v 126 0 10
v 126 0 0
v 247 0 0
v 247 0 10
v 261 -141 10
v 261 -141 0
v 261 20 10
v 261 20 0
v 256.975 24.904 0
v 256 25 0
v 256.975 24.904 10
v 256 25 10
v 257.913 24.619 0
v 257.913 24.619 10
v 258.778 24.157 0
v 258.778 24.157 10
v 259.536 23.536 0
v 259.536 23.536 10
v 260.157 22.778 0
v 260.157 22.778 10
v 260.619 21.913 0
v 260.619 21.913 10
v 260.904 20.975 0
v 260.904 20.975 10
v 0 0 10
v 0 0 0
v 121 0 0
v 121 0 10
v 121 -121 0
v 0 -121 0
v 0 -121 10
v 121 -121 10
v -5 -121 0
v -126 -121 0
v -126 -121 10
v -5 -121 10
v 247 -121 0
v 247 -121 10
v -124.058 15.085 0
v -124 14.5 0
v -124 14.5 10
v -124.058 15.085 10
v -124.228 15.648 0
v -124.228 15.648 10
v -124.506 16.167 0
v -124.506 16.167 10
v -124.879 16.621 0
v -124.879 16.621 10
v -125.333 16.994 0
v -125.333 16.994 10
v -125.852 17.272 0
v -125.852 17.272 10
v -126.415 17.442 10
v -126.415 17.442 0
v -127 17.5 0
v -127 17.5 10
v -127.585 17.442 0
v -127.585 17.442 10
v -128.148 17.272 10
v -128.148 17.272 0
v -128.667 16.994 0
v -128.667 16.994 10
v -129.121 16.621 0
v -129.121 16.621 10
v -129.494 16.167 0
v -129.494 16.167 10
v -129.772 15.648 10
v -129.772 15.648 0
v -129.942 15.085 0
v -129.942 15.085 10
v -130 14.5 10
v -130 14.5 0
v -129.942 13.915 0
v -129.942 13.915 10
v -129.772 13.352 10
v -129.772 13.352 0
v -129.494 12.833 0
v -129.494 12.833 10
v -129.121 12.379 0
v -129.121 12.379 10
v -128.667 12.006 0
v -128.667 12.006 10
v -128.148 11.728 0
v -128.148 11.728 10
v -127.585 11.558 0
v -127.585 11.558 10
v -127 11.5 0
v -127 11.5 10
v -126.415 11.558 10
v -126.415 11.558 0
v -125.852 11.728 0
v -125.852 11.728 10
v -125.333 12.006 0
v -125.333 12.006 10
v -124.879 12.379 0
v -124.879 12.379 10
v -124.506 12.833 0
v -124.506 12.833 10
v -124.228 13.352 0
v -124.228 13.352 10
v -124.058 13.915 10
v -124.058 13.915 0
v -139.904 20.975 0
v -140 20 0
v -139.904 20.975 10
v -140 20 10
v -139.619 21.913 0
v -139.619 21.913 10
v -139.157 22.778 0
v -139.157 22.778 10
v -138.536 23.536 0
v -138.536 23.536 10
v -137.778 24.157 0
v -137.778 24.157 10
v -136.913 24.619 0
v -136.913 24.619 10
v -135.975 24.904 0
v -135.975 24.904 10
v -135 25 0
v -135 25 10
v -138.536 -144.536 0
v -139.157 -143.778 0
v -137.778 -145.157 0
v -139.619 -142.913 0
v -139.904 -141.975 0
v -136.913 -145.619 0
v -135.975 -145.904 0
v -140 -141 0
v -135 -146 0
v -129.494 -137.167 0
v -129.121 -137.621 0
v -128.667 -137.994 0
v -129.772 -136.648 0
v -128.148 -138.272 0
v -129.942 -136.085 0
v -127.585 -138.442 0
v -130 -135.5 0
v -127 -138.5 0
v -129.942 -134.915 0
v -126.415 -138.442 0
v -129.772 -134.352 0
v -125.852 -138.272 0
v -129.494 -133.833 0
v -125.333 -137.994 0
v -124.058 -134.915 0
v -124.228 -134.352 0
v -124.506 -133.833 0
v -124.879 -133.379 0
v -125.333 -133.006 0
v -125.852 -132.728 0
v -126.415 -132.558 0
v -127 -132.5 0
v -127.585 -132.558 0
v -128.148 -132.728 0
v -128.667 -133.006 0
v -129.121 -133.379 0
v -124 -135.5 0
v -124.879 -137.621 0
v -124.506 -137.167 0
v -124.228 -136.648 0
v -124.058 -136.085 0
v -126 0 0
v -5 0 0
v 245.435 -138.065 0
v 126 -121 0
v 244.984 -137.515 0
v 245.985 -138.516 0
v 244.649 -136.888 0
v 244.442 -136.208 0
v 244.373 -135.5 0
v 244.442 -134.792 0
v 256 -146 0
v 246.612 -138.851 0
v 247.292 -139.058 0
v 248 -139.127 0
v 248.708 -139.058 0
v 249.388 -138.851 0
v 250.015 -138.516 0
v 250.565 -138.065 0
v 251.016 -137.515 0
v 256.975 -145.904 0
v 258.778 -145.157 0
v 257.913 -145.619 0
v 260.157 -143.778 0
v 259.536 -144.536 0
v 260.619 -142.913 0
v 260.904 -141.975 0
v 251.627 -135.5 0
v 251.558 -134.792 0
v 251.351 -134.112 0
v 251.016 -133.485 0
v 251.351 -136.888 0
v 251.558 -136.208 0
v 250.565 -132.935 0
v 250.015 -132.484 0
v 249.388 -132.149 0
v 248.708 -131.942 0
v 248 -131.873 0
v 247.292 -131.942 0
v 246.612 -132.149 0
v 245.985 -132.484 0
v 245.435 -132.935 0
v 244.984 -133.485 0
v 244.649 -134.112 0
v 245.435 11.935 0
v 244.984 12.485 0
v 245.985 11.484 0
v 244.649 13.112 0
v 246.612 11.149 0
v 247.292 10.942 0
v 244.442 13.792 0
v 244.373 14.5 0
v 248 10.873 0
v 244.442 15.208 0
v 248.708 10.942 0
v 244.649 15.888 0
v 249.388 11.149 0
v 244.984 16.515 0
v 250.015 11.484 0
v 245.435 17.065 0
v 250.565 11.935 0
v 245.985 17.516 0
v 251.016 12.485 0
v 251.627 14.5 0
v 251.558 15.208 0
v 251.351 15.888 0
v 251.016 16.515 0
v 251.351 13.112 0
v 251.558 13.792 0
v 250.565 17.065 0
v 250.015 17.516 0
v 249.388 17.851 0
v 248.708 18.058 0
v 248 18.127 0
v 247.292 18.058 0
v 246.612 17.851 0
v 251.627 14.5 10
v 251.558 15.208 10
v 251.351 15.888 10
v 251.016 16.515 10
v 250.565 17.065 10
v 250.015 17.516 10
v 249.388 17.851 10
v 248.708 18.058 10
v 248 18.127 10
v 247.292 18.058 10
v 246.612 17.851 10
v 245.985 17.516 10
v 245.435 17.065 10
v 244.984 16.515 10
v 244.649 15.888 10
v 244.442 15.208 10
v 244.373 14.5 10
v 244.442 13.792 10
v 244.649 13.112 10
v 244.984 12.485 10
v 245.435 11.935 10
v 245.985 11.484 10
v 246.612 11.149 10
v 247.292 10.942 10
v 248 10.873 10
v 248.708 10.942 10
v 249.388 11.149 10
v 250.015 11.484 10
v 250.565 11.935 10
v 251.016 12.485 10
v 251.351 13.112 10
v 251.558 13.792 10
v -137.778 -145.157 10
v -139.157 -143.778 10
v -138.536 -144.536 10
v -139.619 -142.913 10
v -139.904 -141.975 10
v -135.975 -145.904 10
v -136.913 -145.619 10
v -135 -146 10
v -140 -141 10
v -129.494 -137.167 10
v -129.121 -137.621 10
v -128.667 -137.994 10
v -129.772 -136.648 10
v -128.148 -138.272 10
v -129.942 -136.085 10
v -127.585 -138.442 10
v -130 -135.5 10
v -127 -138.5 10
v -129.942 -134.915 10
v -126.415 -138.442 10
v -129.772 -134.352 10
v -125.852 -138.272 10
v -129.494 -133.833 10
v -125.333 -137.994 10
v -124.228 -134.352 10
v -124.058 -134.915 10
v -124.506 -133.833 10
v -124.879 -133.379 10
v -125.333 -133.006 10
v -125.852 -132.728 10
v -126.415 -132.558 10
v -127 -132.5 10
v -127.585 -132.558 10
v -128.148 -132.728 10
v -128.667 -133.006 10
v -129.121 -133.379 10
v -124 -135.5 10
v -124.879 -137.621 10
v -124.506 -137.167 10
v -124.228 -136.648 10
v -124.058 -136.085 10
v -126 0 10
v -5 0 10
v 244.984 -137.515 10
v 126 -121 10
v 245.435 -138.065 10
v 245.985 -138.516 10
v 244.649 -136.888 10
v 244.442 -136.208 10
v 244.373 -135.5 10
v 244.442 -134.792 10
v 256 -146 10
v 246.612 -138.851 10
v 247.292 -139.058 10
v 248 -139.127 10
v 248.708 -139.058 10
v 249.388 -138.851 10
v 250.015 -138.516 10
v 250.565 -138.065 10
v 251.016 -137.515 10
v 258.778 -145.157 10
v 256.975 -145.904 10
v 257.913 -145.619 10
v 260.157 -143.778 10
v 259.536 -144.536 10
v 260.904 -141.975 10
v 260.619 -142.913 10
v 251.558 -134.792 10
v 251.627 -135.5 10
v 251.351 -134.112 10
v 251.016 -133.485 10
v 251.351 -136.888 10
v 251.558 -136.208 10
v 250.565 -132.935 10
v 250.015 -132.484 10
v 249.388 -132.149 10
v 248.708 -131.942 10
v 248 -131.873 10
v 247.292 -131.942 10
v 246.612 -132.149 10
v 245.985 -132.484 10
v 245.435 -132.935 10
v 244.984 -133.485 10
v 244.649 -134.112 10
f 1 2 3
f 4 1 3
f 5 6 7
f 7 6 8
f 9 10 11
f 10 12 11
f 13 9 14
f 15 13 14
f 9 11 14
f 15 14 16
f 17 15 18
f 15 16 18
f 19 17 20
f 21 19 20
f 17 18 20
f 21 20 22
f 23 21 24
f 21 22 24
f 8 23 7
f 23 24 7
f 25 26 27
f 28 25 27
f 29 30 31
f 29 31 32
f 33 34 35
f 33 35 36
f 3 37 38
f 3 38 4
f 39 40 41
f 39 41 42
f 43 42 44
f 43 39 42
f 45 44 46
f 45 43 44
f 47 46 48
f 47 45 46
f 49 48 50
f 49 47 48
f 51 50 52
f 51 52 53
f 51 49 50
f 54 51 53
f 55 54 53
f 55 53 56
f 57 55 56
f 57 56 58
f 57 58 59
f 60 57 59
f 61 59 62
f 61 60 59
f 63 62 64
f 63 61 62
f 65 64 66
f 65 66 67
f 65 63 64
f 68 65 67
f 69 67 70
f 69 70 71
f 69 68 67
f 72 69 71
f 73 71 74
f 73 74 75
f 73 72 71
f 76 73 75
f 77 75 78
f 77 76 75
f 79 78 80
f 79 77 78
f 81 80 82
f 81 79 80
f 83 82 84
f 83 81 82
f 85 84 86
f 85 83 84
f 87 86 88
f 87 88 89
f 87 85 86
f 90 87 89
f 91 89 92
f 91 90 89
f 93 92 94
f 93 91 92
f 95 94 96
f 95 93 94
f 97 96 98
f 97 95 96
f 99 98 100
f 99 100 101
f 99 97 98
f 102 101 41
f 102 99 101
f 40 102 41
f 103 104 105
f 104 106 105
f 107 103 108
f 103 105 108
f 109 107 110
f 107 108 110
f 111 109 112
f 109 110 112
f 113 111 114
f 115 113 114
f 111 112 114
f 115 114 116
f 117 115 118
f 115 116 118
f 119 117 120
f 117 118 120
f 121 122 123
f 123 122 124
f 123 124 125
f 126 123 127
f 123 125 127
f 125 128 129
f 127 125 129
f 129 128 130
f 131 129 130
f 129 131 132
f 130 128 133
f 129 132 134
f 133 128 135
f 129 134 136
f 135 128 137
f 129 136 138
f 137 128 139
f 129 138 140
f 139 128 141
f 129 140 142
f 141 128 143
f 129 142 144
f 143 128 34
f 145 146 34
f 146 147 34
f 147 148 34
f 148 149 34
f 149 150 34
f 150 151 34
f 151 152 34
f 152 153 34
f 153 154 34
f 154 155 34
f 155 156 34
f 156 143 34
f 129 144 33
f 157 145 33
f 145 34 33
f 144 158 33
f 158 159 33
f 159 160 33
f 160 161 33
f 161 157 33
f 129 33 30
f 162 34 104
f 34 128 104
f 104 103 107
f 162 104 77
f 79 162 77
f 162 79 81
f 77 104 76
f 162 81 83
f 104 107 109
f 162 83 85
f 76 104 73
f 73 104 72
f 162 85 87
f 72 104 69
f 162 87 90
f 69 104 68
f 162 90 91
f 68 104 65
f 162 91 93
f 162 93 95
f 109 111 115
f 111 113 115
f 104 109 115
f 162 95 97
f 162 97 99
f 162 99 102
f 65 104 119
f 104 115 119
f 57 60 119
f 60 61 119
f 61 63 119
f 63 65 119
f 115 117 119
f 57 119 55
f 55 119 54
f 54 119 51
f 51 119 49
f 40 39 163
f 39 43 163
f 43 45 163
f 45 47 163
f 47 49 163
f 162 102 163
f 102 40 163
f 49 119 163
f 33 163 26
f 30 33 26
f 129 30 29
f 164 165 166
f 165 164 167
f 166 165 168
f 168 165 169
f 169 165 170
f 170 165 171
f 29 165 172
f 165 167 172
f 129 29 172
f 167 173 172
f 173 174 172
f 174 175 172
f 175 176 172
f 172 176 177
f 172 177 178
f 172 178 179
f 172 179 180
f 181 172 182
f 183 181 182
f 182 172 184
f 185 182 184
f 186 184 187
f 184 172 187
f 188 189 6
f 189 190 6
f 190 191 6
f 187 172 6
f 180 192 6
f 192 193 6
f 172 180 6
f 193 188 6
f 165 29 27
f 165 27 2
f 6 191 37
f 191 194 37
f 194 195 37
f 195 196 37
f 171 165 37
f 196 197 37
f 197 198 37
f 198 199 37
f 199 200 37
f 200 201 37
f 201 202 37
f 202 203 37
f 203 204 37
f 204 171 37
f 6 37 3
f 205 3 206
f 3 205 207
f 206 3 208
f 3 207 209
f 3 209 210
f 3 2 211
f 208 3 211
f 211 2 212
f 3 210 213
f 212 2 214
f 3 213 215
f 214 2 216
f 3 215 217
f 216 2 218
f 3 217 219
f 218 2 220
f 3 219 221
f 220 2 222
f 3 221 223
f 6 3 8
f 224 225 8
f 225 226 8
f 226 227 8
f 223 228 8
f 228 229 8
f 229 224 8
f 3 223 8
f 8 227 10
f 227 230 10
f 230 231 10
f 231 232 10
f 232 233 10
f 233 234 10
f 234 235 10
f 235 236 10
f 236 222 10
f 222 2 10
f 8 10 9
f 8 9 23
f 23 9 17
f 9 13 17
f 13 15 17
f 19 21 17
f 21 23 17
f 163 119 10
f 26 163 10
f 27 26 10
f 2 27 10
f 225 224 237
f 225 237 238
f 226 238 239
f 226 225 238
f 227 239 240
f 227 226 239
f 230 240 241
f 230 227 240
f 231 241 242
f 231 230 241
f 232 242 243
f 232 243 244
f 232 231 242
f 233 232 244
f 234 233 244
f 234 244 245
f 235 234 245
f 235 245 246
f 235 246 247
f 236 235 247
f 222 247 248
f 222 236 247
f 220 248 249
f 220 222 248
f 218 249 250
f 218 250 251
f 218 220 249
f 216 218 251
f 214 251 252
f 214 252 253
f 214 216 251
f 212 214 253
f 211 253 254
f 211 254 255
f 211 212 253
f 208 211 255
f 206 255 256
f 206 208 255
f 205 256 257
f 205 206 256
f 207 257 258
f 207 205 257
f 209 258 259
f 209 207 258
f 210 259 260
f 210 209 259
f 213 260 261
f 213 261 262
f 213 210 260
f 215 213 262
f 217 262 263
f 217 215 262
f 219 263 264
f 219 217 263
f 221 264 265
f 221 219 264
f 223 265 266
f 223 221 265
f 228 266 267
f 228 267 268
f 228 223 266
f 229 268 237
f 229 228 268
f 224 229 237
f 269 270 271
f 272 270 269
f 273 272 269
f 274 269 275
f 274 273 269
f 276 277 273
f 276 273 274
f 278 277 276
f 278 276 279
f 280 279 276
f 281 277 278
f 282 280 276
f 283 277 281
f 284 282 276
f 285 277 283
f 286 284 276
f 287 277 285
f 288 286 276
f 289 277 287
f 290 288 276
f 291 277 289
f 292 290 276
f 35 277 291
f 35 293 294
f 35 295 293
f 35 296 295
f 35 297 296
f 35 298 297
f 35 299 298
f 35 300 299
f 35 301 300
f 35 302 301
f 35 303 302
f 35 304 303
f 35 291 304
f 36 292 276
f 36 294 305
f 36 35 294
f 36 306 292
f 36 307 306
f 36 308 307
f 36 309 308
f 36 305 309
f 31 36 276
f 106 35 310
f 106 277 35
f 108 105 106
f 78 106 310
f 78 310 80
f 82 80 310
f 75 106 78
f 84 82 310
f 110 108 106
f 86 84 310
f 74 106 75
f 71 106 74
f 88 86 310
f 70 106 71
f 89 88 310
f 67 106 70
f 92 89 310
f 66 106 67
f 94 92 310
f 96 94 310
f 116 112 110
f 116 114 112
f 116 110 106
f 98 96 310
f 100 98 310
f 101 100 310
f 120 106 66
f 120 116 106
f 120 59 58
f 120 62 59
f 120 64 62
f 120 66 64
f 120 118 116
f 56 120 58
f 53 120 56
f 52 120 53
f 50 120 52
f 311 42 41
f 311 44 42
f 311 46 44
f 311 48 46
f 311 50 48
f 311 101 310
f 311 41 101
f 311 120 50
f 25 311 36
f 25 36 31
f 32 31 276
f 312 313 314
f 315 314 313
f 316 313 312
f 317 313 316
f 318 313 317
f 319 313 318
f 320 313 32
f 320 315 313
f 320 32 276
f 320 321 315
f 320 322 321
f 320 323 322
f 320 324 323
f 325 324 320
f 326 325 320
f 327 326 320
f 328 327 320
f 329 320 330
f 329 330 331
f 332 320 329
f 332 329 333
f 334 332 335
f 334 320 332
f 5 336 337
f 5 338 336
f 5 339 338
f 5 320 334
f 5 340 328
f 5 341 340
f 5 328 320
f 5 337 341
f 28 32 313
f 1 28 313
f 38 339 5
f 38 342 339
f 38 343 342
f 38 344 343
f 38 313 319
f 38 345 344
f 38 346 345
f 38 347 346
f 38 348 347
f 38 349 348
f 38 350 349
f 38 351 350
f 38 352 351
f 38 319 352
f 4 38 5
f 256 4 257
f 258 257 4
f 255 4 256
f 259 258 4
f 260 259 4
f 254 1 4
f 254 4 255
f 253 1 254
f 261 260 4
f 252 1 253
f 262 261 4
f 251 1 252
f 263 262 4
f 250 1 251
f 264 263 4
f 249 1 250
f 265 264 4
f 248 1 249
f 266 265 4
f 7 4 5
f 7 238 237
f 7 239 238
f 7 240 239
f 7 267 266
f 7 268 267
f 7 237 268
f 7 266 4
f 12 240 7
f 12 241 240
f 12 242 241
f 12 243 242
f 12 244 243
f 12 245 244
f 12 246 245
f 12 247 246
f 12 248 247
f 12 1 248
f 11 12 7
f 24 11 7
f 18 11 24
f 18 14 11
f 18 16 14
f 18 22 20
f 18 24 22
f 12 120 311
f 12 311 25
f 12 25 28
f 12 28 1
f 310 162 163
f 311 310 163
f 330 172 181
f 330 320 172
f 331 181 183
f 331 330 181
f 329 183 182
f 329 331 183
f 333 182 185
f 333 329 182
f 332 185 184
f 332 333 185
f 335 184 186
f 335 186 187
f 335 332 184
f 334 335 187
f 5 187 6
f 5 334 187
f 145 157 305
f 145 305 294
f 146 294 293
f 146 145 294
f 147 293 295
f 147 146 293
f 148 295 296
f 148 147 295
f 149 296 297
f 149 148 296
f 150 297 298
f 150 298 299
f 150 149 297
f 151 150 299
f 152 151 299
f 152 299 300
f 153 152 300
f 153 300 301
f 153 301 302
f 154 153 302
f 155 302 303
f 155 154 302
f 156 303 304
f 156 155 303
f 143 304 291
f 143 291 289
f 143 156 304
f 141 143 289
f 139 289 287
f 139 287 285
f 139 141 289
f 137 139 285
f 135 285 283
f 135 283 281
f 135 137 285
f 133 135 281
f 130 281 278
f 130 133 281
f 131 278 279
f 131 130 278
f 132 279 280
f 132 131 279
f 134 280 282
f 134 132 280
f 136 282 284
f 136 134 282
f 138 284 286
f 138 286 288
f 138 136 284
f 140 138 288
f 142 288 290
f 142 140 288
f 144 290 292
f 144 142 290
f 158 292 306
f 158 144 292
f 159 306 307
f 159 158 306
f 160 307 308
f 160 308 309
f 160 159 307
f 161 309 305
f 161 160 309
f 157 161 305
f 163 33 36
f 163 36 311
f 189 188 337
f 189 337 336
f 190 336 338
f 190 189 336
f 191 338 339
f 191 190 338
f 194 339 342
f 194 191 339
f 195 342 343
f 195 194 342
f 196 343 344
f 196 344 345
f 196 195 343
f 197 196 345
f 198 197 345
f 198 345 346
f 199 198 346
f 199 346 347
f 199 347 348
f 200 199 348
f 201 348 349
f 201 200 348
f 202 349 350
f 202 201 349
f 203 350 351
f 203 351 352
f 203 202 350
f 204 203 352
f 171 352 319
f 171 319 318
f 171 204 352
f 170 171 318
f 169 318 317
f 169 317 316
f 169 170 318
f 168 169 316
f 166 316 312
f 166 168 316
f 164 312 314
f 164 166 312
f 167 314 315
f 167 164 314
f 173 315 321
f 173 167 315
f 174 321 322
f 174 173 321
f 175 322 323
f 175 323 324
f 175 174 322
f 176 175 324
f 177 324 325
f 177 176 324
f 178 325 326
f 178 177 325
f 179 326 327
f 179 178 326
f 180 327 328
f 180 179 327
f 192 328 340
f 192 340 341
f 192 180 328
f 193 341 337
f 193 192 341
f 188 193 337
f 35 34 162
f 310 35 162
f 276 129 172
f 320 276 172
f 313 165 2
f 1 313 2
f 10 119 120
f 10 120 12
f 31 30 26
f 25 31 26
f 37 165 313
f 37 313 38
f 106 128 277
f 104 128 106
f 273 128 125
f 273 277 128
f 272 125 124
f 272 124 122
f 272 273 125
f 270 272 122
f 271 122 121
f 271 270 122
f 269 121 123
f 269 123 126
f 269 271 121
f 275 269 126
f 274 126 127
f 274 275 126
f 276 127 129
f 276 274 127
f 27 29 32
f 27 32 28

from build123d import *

# Parameters (mm, degrees)
F0_W     = 401
F0_H     = 171
F0_R     = 3
F0_R_2   = 3.627457
F0_W_2   = 121
F0_H_2   = 121
F1_DEPTH = 10
F2_R     = 5


with BuildPart() as f1:
    # F0 (on Top) → F1 (new body)
    with BuildSketch(Plane.XY):
        with Locations((60.5, -60.5)):
            Rectangle(F0_W, F0_H)
        with Locations((-127, -135.5)):
            Circle(F0_R, mode=Mode.SUBTRACT)
        with Locations((248, -135.5)):
            Circle(F0_R_2, mode=Mode.SUBTRACT)
        with Locations((-65.5, -60.5)):
            Rectangle(F0_W_2, F0_H_2, mode=Mode.SUBTRACT)
        with Locations((-127, 14.5)):
            Circle(F0_R, mode=Mode.SUBTRACT)
        with Locations((60.5, -60.5)):
            Rectangle(F0_W_2, F0_H_2, mode=Mode.SUBTRACT)
        with Locations((186.5, -60.5)):
            Rectangle(F0_W_2, F0_H_2, mode=Mode.SUBTRACT)
        with Locations((248, 14.5)):
            Circle(F0_R_2, mode=Mode.SUBTRACT)
    extrude(amount=F1_DEPTH)

    # F2
    f2_edges = [f1.edges().sort_by_distance(p)[0] for p in [
        (261, 25, 5),
        (261, -146, 5),
        (-140, -146, 5),
        (-140, 25, 5),
    ]]
    fillet(f2_edges, radius=F2_R)


solid = f1.part
